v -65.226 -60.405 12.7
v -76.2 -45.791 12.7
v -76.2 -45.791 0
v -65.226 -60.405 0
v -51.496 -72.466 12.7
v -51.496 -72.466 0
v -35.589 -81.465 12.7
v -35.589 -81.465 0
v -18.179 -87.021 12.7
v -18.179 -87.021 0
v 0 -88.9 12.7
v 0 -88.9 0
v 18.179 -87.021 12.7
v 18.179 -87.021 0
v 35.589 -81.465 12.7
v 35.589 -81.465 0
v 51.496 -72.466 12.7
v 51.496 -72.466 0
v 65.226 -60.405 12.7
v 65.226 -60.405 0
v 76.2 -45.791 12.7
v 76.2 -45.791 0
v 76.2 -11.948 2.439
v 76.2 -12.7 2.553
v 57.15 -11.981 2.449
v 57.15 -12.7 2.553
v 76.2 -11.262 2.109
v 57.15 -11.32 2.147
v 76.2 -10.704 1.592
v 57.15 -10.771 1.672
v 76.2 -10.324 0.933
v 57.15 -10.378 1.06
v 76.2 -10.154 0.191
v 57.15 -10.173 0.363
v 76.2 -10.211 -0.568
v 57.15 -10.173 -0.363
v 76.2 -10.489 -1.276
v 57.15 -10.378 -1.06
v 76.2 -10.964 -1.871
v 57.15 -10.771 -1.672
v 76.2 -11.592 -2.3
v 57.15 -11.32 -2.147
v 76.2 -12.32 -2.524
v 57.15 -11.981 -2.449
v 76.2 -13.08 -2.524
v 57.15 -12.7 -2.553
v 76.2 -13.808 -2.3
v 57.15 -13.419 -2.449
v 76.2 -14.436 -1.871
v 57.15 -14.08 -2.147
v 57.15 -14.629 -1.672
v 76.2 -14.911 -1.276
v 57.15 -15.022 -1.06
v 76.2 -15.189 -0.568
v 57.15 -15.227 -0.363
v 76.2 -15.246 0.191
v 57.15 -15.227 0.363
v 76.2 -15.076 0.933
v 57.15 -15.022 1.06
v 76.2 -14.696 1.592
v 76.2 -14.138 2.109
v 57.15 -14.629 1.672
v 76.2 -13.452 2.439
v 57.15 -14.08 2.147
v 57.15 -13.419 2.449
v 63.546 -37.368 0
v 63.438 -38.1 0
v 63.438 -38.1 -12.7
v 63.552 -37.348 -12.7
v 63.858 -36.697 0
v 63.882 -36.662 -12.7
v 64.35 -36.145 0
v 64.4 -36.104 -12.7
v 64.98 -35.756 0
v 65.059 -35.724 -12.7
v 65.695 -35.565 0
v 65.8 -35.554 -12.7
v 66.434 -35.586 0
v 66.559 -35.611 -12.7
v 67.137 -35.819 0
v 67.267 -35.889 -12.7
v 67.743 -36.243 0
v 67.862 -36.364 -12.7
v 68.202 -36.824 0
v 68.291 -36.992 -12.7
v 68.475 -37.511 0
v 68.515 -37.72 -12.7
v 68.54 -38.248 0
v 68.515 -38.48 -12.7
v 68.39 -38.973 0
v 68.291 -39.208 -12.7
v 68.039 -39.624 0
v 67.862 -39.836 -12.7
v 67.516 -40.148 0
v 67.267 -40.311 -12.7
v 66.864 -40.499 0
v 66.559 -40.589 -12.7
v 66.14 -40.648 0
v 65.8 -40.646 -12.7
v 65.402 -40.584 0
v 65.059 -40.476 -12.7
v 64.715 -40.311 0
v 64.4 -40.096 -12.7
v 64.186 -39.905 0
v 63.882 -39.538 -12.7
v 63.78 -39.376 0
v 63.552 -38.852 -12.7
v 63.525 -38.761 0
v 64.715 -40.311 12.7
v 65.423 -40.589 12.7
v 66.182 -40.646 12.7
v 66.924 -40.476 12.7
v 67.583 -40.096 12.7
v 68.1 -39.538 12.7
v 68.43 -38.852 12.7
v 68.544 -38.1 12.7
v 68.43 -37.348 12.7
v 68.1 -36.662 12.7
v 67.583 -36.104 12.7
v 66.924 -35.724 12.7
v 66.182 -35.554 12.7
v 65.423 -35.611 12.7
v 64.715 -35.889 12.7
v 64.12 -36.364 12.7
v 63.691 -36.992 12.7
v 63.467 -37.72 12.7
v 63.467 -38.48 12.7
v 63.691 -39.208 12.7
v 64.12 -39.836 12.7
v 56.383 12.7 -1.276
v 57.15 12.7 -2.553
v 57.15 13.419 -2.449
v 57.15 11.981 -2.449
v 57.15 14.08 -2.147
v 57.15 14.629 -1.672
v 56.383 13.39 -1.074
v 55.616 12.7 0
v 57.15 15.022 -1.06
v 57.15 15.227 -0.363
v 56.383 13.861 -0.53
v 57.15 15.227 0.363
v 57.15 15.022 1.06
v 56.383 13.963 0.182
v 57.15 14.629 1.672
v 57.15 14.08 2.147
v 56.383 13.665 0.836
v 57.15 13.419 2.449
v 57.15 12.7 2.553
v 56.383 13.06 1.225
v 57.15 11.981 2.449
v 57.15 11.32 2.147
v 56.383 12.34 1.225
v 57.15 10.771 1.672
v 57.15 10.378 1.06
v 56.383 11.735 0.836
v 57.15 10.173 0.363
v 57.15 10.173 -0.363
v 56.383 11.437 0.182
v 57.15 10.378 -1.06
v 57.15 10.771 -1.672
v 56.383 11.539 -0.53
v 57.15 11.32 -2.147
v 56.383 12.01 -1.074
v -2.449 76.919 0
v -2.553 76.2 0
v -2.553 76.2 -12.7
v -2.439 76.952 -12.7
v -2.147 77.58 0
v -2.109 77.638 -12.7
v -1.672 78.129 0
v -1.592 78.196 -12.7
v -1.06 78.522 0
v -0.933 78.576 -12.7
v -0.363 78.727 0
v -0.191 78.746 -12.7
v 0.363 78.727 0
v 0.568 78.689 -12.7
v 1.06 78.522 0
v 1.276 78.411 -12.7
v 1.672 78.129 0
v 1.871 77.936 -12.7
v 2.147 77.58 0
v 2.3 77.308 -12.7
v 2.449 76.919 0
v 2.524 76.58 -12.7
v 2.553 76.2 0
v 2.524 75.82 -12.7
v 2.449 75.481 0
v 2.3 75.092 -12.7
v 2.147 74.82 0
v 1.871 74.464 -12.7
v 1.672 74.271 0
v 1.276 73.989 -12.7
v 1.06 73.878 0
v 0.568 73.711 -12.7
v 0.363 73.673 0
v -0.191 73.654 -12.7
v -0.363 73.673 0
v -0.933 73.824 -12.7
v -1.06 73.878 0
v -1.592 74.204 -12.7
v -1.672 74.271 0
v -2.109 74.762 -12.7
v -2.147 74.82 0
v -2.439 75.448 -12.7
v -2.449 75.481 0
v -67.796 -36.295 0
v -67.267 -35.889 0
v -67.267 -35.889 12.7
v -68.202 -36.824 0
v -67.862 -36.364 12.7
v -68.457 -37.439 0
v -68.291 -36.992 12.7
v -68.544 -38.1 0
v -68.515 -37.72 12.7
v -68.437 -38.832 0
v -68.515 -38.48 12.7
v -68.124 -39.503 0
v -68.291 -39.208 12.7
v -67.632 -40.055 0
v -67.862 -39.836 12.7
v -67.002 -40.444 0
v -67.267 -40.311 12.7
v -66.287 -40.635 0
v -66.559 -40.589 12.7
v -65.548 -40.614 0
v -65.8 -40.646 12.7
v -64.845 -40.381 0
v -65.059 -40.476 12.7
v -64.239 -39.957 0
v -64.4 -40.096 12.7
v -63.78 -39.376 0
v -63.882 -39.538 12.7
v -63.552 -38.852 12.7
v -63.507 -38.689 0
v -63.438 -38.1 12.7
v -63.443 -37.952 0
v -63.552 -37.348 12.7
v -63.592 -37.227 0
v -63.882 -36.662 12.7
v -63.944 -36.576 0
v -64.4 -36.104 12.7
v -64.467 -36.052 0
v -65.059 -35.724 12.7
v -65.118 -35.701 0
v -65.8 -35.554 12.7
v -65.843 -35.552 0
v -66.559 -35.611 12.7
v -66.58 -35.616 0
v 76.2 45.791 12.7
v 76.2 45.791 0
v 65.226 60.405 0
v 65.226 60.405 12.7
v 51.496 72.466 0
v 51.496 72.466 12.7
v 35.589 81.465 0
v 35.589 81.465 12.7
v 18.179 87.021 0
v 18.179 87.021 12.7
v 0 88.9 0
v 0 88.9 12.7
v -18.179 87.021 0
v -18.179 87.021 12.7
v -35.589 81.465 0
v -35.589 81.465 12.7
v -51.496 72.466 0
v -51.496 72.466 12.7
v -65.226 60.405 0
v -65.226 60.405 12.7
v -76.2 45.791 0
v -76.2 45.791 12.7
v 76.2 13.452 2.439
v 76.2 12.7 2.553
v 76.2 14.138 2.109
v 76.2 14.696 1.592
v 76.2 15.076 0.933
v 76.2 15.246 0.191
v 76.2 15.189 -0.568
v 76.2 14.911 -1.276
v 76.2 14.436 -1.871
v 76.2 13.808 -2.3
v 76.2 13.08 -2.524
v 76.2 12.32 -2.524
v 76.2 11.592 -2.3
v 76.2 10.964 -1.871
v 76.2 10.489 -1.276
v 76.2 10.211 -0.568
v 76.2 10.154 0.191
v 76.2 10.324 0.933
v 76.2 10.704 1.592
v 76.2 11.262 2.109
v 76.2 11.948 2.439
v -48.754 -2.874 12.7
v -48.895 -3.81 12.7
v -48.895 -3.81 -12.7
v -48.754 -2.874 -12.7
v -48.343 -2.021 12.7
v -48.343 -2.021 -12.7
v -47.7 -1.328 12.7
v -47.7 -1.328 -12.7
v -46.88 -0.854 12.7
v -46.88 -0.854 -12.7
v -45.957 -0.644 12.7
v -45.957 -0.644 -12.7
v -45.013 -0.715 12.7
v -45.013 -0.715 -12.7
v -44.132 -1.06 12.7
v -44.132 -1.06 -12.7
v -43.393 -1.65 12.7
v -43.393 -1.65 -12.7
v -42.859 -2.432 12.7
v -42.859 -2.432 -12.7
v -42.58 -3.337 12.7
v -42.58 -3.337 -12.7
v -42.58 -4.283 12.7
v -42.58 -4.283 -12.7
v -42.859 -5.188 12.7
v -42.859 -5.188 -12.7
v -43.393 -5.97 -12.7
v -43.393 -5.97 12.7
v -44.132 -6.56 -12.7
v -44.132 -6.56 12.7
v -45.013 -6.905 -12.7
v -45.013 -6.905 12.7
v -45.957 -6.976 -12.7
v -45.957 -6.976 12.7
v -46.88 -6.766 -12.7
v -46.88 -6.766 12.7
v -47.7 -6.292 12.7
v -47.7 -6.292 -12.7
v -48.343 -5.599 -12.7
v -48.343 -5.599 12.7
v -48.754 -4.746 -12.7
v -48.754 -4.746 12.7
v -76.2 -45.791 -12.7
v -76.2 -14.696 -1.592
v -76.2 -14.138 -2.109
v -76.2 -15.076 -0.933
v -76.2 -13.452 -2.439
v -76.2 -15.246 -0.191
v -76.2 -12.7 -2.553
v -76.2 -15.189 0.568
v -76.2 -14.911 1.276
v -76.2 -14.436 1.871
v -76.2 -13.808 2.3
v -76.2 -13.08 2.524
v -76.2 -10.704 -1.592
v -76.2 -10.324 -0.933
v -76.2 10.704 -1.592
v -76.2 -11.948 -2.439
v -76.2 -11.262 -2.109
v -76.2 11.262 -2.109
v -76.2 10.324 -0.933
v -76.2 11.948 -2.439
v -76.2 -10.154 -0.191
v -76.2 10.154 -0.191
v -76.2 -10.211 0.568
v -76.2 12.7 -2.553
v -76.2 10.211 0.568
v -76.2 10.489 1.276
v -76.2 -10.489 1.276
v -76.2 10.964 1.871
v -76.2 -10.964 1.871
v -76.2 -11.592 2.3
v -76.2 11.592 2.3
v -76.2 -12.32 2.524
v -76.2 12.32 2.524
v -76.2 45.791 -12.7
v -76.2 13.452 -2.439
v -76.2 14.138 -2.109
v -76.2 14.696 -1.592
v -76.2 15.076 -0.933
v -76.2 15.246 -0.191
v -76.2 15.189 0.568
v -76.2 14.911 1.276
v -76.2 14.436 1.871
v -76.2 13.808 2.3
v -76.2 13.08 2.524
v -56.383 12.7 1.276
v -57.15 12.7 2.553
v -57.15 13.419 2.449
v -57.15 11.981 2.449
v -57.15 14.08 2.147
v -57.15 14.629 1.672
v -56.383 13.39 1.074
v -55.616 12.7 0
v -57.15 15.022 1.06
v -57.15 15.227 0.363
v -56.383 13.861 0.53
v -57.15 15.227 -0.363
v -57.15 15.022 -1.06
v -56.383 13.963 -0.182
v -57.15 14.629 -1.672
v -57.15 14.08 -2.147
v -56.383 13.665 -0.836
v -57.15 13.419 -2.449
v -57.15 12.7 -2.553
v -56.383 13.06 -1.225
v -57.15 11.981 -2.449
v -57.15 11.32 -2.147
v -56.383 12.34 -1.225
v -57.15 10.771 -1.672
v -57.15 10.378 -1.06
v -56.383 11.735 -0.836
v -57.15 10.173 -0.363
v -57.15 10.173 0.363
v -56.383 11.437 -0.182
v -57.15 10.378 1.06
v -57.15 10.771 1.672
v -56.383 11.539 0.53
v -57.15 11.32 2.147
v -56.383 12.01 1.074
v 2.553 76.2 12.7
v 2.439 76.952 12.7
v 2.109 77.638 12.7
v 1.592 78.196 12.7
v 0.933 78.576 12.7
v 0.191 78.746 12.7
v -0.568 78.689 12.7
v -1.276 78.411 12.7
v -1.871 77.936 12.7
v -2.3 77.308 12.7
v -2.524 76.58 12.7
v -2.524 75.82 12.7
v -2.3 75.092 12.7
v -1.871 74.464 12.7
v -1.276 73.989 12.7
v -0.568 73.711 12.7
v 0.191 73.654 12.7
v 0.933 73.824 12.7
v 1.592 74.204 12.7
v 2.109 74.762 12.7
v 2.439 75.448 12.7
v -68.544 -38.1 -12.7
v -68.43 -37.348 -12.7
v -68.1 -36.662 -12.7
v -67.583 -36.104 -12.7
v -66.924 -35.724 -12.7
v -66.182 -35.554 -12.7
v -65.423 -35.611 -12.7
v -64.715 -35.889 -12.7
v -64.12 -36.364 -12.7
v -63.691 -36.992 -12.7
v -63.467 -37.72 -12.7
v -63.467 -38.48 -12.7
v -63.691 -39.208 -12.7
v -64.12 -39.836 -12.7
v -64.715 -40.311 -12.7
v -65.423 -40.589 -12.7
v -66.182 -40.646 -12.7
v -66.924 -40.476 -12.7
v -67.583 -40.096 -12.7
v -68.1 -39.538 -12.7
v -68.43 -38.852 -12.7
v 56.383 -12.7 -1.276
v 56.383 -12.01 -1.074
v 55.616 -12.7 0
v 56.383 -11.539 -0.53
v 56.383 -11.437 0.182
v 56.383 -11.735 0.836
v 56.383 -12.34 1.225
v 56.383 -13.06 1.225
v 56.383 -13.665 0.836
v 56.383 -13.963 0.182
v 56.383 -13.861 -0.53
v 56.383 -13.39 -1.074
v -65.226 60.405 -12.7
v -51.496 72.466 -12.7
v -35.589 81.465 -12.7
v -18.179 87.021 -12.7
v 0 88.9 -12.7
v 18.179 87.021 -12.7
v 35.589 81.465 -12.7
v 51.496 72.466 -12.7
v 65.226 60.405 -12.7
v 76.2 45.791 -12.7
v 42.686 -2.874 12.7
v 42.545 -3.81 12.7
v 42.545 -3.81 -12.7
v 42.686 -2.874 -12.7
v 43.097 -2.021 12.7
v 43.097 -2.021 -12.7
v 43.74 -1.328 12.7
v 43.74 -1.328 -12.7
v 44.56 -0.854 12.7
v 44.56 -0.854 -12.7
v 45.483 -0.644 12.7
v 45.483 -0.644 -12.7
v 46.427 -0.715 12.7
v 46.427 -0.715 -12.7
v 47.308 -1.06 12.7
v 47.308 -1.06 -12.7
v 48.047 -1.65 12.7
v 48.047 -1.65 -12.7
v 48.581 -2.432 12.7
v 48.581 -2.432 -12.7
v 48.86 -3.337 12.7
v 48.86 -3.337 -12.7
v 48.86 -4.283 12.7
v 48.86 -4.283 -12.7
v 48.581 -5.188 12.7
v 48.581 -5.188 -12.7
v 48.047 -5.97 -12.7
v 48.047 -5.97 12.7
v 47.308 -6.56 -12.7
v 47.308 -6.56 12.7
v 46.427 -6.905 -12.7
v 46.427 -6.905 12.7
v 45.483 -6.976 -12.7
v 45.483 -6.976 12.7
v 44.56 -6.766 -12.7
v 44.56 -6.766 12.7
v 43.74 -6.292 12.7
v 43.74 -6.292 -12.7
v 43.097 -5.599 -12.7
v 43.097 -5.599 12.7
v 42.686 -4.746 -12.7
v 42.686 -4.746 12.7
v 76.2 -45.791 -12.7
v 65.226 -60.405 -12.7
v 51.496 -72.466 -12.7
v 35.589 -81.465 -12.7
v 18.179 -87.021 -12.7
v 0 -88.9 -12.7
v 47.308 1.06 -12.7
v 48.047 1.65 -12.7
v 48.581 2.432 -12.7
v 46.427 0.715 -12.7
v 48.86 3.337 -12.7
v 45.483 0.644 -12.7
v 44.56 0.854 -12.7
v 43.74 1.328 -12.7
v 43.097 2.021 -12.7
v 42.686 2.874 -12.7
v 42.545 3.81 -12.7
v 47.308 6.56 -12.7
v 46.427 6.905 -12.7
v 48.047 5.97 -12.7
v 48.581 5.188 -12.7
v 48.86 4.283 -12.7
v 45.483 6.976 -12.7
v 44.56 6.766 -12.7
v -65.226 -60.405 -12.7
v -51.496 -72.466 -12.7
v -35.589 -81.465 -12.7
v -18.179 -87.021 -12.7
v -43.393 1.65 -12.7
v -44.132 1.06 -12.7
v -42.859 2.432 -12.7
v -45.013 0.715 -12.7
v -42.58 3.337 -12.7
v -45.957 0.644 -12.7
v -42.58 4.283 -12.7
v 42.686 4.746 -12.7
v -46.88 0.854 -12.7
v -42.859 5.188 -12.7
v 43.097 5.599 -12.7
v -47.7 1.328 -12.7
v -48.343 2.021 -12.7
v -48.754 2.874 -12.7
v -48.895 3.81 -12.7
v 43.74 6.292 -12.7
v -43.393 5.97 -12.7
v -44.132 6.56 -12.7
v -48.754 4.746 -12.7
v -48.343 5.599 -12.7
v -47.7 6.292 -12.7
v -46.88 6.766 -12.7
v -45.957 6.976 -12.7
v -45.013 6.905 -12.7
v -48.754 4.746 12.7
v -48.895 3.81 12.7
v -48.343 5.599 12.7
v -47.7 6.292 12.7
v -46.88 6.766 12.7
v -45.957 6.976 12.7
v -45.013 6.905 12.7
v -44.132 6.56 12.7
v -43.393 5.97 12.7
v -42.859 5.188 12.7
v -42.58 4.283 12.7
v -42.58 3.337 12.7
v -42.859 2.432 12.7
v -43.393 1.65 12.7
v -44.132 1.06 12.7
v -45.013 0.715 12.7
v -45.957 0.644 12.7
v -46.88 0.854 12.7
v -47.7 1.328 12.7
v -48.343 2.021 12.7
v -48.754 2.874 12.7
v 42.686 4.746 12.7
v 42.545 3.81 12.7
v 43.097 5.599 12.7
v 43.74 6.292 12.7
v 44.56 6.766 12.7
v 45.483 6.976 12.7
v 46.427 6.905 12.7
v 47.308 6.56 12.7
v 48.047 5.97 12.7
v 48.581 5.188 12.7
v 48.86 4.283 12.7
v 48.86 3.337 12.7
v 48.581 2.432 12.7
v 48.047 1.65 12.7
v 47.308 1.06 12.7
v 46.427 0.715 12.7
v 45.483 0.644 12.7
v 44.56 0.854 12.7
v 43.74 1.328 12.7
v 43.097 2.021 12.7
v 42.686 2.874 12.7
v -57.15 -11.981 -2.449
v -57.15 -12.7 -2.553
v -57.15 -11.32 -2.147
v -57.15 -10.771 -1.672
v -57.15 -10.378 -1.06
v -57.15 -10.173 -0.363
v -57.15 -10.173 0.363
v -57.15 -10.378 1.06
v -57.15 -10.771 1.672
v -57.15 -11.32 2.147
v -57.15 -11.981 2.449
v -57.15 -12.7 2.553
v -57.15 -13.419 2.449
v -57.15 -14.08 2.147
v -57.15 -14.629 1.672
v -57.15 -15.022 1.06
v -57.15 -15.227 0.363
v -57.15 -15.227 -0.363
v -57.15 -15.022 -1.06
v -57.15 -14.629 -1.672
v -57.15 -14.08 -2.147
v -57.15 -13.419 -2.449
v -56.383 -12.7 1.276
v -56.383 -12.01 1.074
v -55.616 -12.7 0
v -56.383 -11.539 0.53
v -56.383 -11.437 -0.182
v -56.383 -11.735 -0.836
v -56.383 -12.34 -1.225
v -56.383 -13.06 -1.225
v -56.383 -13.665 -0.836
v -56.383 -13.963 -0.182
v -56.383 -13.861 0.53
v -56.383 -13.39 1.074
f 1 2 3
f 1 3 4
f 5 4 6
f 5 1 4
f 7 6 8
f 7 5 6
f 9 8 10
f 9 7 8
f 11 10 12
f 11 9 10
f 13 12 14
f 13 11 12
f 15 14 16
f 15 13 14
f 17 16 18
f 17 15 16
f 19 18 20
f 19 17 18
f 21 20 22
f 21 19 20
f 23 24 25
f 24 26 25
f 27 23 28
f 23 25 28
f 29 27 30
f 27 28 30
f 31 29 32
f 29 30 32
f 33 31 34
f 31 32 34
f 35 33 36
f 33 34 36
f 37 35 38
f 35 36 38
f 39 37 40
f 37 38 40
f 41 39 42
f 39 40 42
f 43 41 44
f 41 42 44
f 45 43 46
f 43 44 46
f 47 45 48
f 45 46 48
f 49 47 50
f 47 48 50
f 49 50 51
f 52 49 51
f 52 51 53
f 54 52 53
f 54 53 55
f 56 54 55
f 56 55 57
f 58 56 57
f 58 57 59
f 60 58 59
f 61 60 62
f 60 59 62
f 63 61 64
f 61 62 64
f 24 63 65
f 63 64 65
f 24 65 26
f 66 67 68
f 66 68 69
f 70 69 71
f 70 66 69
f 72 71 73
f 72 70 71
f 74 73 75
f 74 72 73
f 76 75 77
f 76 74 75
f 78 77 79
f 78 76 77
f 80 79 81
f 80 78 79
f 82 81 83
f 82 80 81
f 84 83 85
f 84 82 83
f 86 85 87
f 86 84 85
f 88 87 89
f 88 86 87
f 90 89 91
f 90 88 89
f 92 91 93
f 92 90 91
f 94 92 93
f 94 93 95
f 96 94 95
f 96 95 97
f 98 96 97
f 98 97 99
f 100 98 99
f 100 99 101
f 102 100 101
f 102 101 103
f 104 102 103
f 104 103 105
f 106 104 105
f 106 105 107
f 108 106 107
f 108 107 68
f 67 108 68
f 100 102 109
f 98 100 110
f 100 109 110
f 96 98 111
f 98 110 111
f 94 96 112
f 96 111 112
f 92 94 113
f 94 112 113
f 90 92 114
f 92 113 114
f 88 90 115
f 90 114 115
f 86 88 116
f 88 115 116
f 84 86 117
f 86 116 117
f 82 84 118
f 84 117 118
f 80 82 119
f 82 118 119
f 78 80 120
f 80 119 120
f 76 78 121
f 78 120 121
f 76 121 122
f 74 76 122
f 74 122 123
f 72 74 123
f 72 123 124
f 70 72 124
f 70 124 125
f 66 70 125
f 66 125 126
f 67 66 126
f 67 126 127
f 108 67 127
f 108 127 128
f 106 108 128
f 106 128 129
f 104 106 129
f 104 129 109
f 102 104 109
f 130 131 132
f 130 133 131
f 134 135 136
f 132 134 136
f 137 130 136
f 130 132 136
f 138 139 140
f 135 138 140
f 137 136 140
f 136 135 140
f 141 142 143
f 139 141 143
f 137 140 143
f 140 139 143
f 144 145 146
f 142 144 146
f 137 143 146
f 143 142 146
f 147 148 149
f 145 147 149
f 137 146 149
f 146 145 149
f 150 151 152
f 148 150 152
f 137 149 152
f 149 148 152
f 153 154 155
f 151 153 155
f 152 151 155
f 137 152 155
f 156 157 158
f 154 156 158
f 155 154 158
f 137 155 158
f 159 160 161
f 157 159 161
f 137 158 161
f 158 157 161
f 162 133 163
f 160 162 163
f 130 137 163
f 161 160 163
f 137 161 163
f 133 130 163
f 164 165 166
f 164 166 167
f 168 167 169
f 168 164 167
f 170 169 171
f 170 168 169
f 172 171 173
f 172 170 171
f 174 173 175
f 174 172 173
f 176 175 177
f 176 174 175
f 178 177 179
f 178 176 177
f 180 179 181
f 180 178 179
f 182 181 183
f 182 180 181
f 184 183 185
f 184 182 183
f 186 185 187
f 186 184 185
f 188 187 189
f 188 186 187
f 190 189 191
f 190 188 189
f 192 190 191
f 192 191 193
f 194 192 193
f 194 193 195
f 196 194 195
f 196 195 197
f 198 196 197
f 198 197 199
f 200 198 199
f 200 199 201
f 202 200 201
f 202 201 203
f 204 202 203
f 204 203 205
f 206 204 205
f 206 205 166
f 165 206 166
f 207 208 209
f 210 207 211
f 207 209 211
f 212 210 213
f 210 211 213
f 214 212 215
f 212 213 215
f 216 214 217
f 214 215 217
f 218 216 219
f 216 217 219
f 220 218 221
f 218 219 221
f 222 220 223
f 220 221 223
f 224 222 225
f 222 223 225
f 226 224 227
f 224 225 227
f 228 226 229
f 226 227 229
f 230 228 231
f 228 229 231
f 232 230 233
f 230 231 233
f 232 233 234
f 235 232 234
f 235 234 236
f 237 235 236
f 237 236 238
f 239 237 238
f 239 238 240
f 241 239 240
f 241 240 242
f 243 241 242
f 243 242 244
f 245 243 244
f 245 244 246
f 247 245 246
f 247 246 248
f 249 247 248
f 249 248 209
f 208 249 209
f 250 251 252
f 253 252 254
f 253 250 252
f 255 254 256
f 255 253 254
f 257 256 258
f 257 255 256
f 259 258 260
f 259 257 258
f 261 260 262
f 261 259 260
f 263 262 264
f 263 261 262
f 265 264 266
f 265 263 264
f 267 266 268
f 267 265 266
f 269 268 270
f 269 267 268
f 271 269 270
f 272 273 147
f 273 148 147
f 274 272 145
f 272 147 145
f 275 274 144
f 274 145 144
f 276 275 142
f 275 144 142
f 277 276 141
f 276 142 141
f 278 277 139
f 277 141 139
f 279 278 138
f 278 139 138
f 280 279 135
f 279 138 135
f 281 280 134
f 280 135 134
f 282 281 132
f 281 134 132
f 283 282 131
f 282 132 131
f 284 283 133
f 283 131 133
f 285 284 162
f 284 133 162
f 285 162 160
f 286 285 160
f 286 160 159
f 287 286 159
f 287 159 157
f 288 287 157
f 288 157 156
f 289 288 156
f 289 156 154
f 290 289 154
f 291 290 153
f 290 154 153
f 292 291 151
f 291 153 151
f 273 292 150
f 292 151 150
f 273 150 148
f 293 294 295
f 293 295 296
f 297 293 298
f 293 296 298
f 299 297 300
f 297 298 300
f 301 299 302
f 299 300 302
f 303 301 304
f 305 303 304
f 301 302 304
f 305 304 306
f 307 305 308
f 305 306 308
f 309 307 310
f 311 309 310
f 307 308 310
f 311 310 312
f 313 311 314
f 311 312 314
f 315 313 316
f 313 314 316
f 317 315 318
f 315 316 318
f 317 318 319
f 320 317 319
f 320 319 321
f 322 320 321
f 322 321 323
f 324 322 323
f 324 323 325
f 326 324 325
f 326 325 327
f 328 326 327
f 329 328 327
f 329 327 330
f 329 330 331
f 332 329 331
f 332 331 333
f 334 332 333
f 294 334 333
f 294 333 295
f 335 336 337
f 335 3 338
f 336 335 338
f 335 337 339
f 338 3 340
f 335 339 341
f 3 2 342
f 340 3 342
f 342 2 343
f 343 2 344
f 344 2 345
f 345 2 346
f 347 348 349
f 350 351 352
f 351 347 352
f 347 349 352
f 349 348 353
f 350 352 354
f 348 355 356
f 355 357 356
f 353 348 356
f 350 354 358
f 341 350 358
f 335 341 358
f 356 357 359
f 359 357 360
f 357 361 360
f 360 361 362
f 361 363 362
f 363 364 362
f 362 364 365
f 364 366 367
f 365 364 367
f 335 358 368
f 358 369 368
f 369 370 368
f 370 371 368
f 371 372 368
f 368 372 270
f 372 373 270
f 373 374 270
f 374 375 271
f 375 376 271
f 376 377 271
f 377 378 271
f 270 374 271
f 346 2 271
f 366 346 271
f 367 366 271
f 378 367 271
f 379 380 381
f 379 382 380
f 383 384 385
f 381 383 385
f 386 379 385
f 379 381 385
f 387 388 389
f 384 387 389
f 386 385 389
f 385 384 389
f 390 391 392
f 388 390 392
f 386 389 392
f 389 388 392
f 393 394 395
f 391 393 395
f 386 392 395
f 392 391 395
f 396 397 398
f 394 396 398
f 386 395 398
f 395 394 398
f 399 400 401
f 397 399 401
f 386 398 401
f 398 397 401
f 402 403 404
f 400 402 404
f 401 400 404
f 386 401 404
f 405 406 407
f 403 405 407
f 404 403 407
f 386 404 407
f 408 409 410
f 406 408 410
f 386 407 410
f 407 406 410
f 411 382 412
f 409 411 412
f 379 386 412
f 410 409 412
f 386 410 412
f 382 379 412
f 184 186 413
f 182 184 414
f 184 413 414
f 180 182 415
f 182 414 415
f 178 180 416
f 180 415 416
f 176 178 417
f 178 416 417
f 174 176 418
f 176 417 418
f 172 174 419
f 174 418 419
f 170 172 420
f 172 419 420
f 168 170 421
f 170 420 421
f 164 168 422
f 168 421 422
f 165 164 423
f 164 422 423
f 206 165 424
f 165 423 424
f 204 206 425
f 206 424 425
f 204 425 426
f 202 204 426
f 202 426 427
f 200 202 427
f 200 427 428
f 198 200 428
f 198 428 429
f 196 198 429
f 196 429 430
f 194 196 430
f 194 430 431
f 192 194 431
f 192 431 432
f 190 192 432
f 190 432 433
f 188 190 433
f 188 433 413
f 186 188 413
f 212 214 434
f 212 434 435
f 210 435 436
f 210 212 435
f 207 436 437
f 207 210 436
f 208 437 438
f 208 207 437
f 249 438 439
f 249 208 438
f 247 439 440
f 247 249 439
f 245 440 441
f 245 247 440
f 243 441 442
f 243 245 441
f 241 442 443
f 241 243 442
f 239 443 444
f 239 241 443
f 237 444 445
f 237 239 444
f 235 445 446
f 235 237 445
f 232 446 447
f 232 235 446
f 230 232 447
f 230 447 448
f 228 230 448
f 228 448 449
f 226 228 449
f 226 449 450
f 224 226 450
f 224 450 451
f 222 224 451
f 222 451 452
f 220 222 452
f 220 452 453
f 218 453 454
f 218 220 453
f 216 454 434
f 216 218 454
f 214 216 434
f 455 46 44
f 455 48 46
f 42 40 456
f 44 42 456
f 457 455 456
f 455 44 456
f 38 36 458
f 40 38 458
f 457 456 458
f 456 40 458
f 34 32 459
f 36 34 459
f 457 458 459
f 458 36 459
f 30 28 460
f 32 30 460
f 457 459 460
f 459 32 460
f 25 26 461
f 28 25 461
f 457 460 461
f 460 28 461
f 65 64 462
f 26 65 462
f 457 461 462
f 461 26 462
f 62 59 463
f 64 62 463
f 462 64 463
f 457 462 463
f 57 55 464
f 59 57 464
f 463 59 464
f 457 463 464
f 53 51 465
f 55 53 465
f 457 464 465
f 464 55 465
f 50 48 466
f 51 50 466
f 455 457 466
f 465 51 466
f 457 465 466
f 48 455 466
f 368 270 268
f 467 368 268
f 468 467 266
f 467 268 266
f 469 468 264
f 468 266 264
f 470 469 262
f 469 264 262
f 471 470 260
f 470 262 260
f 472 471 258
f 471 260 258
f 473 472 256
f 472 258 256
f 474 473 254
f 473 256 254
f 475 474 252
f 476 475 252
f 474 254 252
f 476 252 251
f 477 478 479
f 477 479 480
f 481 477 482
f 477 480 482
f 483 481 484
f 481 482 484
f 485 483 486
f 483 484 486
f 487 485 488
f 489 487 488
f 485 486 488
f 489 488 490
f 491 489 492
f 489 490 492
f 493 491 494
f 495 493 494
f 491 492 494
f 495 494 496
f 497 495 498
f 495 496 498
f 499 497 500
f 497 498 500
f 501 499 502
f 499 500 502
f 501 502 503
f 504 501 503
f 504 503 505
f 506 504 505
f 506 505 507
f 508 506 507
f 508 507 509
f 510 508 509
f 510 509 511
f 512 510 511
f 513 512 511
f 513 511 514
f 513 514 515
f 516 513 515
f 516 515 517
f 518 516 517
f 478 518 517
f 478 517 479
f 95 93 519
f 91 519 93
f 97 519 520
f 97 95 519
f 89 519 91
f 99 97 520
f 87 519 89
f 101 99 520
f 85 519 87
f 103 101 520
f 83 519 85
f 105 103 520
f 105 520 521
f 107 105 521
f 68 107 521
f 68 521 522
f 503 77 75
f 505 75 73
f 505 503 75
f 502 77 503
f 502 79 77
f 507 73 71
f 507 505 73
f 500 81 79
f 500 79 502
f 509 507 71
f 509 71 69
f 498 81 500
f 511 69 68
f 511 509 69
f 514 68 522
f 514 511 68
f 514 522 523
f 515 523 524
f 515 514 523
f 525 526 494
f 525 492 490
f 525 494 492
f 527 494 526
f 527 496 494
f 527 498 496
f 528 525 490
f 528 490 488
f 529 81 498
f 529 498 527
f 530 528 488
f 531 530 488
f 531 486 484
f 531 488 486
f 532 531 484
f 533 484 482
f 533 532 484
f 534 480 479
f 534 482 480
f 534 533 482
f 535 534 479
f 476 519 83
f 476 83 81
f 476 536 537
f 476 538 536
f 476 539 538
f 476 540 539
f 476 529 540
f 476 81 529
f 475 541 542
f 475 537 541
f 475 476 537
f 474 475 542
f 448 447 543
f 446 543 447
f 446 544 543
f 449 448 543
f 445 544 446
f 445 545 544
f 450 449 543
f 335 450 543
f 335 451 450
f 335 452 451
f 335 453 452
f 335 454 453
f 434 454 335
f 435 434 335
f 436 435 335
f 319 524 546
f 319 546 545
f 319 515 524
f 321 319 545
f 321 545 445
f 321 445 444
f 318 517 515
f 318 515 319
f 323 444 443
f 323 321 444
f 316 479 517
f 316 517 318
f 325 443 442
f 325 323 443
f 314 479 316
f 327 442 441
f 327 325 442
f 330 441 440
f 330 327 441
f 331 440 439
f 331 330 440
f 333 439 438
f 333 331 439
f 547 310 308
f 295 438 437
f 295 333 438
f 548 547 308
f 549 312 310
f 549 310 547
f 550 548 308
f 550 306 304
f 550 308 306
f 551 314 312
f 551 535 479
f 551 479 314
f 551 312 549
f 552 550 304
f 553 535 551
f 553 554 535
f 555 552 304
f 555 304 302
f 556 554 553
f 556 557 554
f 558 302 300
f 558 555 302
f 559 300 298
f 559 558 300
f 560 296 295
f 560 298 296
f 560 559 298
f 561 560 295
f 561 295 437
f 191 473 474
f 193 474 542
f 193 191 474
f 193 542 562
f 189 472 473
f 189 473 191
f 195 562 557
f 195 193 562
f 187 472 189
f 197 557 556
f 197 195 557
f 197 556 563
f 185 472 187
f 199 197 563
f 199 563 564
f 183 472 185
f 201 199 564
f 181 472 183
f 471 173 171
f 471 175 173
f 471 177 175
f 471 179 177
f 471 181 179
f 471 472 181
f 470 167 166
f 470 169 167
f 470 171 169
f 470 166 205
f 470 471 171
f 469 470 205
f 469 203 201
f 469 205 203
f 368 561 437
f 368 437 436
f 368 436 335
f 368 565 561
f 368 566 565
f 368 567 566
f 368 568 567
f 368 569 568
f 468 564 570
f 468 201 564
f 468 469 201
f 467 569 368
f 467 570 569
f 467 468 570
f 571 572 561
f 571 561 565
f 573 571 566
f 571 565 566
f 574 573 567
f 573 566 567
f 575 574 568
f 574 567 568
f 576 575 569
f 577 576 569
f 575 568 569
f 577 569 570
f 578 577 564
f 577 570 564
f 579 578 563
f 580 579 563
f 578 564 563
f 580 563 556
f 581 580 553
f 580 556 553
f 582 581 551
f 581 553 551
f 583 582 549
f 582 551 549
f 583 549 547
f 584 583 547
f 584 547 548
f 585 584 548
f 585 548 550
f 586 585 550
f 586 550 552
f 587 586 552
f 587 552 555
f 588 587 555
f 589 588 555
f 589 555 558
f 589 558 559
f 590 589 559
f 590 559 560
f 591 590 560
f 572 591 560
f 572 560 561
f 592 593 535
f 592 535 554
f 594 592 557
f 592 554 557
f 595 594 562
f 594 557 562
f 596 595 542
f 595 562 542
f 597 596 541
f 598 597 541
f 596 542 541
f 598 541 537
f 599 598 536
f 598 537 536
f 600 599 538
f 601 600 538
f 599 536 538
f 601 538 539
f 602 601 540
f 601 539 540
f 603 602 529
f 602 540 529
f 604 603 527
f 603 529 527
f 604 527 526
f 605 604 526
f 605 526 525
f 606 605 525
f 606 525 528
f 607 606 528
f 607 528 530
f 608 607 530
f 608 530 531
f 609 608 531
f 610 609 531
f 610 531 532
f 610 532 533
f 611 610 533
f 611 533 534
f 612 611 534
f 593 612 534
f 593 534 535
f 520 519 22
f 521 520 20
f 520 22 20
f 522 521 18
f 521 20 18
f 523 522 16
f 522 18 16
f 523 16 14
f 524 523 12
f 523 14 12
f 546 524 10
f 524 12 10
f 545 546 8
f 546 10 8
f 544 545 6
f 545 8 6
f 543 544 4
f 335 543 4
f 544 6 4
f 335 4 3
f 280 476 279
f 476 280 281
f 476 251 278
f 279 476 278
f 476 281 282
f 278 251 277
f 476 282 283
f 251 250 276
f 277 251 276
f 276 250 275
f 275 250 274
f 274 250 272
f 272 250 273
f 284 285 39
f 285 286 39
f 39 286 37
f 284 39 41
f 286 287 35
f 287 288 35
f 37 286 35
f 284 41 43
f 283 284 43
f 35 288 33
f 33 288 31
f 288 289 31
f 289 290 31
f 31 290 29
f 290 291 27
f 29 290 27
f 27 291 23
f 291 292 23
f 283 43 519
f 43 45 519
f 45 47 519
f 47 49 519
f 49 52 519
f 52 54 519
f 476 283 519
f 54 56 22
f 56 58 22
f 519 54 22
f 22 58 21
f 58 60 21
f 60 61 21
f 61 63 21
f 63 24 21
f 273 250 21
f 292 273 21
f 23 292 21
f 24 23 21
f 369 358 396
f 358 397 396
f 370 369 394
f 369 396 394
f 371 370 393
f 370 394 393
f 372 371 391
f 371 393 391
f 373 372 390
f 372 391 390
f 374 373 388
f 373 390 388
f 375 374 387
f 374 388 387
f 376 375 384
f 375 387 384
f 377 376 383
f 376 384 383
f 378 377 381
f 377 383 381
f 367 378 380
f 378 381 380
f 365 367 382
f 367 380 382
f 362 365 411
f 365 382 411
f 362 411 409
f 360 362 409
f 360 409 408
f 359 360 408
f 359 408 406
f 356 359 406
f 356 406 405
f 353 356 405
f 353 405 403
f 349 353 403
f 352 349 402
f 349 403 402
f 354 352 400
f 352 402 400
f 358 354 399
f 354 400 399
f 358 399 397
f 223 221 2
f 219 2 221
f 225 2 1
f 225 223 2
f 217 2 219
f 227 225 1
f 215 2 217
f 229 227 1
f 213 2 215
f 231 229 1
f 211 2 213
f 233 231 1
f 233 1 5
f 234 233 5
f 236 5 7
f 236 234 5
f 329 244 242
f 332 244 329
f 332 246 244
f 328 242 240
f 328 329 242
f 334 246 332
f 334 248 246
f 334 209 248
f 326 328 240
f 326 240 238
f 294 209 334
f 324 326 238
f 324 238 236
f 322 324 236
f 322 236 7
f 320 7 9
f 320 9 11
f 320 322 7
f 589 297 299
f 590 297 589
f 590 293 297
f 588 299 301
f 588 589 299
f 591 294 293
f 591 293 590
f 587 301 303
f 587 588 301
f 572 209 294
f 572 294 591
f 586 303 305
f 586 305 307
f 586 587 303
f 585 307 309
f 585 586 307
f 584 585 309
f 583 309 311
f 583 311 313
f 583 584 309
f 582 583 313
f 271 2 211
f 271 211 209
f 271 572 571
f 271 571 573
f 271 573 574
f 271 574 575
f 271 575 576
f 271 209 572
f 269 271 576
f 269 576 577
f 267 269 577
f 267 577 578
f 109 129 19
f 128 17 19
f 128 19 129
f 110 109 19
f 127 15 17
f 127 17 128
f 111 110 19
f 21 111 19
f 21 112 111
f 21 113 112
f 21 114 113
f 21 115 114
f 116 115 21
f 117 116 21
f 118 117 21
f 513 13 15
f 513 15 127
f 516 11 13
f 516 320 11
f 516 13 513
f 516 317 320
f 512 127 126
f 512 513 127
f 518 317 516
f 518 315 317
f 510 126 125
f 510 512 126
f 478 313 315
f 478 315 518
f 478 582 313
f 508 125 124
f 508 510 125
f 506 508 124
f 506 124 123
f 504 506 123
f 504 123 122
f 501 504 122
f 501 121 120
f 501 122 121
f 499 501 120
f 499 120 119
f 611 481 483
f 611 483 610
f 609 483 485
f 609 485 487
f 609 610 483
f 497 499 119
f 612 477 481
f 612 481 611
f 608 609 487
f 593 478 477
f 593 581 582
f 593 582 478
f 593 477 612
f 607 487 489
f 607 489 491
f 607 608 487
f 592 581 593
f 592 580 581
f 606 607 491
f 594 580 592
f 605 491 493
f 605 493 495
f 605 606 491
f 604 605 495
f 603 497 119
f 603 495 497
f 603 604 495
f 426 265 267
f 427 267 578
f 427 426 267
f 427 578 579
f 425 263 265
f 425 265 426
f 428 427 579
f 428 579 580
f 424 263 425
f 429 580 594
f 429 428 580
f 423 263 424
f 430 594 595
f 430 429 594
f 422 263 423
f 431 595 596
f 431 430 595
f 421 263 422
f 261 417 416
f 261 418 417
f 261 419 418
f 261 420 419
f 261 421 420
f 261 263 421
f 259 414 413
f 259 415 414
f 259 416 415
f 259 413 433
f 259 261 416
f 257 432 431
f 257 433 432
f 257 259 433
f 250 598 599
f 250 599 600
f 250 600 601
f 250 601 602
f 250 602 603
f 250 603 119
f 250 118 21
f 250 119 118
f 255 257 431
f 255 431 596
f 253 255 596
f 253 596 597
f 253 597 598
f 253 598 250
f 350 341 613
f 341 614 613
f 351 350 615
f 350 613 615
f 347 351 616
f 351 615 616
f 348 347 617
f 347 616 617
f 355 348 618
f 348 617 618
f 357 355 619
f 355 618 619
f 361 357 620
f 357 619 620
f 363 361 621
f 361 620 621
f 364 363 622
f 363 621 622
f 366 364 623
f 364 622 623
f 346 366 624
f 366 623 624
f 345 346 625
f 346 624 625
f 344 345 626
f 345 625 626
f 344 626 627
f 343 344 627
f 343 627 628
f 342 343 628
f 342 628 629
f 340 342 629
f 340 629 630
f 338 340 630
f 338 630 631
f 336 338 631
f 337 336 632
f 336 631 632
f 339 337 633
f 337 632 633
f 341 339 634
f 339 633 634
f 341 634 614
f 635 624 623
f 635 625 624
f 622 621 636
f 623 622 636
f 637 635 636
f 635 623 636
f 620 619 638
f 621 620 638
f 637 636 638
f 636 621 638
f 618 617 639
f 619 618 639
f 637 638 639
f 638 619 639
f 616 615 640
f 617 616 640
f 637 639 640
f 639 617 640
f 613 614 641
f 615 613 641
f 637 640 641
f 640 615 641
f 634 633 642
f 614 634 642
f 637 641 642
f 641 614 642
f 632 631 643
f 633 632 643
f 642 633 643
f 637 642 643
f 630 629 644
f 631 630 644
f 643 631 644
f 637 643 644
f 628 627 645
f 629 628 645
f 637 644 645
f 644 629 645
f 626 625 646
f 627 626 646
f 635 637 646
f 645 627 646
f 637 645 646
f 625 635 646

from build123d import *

# Parameters (mm, degrees)
SKETCH1_W                   = 177.8
SKETCH1_H                   = 177.8
EXTRUDE1_DEPTH              = 12.7
F_10_CLEARANCE_HOLE1_D      = 5.1054
CIRPATTERN1_COUNT           = 3
SKETCH5_W                   = 177.8
SKETCH5_H                   = 31.75
EXTRUDE2_DEPTH              = 1.5875
SKETCH8_R                   = 152.4
SKETCH8_R_2                 = 88.9
EXTRUDE3_DEPTH              = 13.7
SKETCH9_W                   = 254
SKETCH9_H                   = 254
SKETCH9_W_2                 = 152.4
SKETCH9_H_2                 = 177.8
EXTRUDE4_DEPTH              = 13.7
SKETCH10_W                  = 152.4
SKETCH10_H                  = 38.1
EXTRUDE5_DEPTH              = 12.7
EXTRUDE5_DEPTH_BACK         = 2.54
F_1_4_0_25_DIAMETER_HOLE1_D = 6.35
LPATTERN1_COUNT             = 2
LPATTERN1_PITCH             = 7.62
LPATTERN1_COUNT_DIR2        = 2
LPATTERN1_PITCH_DIR2        = 91.44
F_1_4_20_TAPPED_HOLE1_D     = 5.1054
F_1_4_20_TAPPED_HOLE1_DEPTH = 19.05
F_1_4_20_TAPPED_HOLE1_TIP   = 1.533817
F_1_4_20_TAPPED_HOLE2_D     = 5.1054
F_1_4_20_TAPPED_HOLE2_DEPTH = 19.05
F_1_4_20_TAPPED_HOLE2_TIP   = 1.533817
SKETCH17_R                  = 2.5527
EXTRUDE6_DEPTH              = 12.7


with BuildPart() as part:
    # Sketch1 → Extrude1 (new body)
    with BuildSketch(Plane.XY):
        Rectangle(SKETCH1_W, SKETCH1_H)
    extrude(amount=EXTRUDE1_DEPTH)

    # 10 Clearance Hole1 (through all)
    with Locations(Plane(origin=(0, 0, 0), x_dir=(-1, 0, 0), z_dir=(0, 0, -1))):
        with Locations((0, 76.2)):
            f_10_clearance_hole1 = Hole(F_10_CLEARANCE_HOLE1_D / 2)

    # CirPattern1: 10 Clearance Hole1 ×3 about axis
    cirpattern1_axis = Axis((0, 0, 0), (0, 0, 1))
    for i in range(1, CIRPATTERN1_COUNT):
        add(f_10_clearance_hole1.rotate(cirpattern1_axis, i * 360 / CIRPATTERN1_COUNT), mode=Mode.SUBTRACT)

    # Sketch5 → Extrude2 (cut)
    with BuildSketch(Plane.XY):
        Rectangle(SKETCH5_W, SKETCH5_H)
    extrude(amount=EXTRUDE2_DEPTH, mode=Mode.SUBTRACT)

    # Sketch8 → Extrude3 (cut, through all)
    with BuildSketch(Plane.XY.offset(12.7)):
        Circle(SKETCH8_R)
        Circle(SKETCH8_R_2, mode=Mode.SUBTRACT)
    extrude(amount=-EXTRUDE3_DEPTH, mode=Mode.SUBTRACT)

    # Sketch9 → Extrude4 (cut, through all)
    with BuildSketch(Plane.XY.offset(12.7)):
        Rectangle(SKETCH9_W, SKETCH9_H)
        Rectangle(SKETCH9_W_2, SKETCH9_H_2, mode=Mode.SUBTRACT)
    extrude(amount=-EXTRUDE4_DEPTH, mode=Mode.SUBTRACT)

    # Sketch10 → Extrude5 (add, two sides)
    with BuildSketch(Plane(origin=(0, 0, 0), x_dir=(-1, 0, 0), z_dir=(0, 0, -1))) as extrude5_sk:
        Rectangle(SKETCH10_W, SKETCH10_H)
    extrude(amount=EXTRUDE5_DEPTH)
    extrude(extrude5_sk.sketch, amount=-EXTRUDE5_DEPTH_BACK)

    # 1_4 _0.25_ Diameter Hole1 (through all)
    with Locations(Plane.XY.offset(12.7)):
        with Locations((-45.72, 3.81)):
            f_1_4_0_25_diameter_hole1 = Hole(F_1_4_0_25_DIAMETER_HOLE1_D / 2)

    # LPattern1: 1_4 _0.25_ Diameter Hole1 2 × 2
    with Locations(*[(j * LPATTERN1_PITCH_DIR2, -i * LPATTERN1_PITCH, 0) for i in range(LPATTERN1_COUNT) for j in range(LPATTERN1_COUNT_DIR2) if (i, j) != (0, 0)]):
        add(f_1_4_0_25_diameter_hole1, mode=Mode.SUBTRACT)

    # 1_4-20 Tapped Hole1
    with Locations(Plane.ZY.offset(76.2)):
        with Locations((0, 12.7), (0, -12.7)):
            Hole(F_1_4_20_TAPPED_HOLE1_D / 2, depth=F_1_4_20_TAPPED_HOLE1_DEPTH)
            with Locations((0, 0, -(F_1_4_20_TAPPED_HOLE1_DEPTH + F_1_4_20_TAPPED_HOLE1_TIP / 2))):  # 118° drill point
                Cone(0, F_1_4_20_TAPPED_HOLE1_D / 2, F_1_4_20_TAPPED_HOLE1_TIP, mode=Mode.SUBTRACT)

    # 1_4-20 Tapped Hole2
    with Locations(Plane(origin=(76.2, 0, 0), x_dir=(0, 0, -1), z_dir=(1, 0, 0))):
        with Locations((0, 12.7), (0, -12.7)):
            Hole(F_1_4_20_TAPPED_HOLE2_D / 2, depth=F_1_4_20_TAPPED_HOLE2_DEPTH)
            with Locations((0, 0, -(F_1_4_20_TAPPED_HOLE2_DEPTH + F_1_4_20_TAPPED_HOLE2_TIP / 2))):  # 118° drill point
                Cone(0, F_1_4_20_TAPPED_HOLE2_D / 2, F_1_4_20_TAPPED_HOLE2_TIP, mode=Mode.SUBTRACT)

    # Sketch17 → Extrude6 (add)
    with BuildSketch(Plane(origin=(0, 0, 0), x_dir=(-1, 0, 0), z_dir=(0, 0, -1))):
        with BuildLine():
            Line((76.2, -45.790501), (76.2, -19.05))
            Line((76.2, -19.05), (-76.2, -19.05))
            Line((-76.2, -19.05), (-76.2, -45.790501))
            ThreePointArc((-76.2, -45.790501), (0, -88.9), (76.2, -45.790501))
        make_face()
        with Locations((-65.991136, -38.1)):
            Circle(SKETCH17_R, mode=Mode.SUBTRACT)
        with Locations((65.991136, -38.1)):
            Circle(SKETCH17_R, mode=Mode.SUBTRACT)
        with BuildLine():
            Line((-76.2, 45.790501), (-76.2, 19.05))
            Line((-76.2, 19.05), (76.2, 19.05))
            Line((76.2, 19.05), (76.2, 45.790501))
            ThreePointArc((76.2, 45.790501), (0, 88.9), (-76.2, 45.790501))
        make_face()
        with Locations((0, 76.2)):
            Circle(SKETCH17_R, mode=Mode.SUBTRACT)
    extrude(amount=EXTRUDE6_DEPTH)


solid = part.part
